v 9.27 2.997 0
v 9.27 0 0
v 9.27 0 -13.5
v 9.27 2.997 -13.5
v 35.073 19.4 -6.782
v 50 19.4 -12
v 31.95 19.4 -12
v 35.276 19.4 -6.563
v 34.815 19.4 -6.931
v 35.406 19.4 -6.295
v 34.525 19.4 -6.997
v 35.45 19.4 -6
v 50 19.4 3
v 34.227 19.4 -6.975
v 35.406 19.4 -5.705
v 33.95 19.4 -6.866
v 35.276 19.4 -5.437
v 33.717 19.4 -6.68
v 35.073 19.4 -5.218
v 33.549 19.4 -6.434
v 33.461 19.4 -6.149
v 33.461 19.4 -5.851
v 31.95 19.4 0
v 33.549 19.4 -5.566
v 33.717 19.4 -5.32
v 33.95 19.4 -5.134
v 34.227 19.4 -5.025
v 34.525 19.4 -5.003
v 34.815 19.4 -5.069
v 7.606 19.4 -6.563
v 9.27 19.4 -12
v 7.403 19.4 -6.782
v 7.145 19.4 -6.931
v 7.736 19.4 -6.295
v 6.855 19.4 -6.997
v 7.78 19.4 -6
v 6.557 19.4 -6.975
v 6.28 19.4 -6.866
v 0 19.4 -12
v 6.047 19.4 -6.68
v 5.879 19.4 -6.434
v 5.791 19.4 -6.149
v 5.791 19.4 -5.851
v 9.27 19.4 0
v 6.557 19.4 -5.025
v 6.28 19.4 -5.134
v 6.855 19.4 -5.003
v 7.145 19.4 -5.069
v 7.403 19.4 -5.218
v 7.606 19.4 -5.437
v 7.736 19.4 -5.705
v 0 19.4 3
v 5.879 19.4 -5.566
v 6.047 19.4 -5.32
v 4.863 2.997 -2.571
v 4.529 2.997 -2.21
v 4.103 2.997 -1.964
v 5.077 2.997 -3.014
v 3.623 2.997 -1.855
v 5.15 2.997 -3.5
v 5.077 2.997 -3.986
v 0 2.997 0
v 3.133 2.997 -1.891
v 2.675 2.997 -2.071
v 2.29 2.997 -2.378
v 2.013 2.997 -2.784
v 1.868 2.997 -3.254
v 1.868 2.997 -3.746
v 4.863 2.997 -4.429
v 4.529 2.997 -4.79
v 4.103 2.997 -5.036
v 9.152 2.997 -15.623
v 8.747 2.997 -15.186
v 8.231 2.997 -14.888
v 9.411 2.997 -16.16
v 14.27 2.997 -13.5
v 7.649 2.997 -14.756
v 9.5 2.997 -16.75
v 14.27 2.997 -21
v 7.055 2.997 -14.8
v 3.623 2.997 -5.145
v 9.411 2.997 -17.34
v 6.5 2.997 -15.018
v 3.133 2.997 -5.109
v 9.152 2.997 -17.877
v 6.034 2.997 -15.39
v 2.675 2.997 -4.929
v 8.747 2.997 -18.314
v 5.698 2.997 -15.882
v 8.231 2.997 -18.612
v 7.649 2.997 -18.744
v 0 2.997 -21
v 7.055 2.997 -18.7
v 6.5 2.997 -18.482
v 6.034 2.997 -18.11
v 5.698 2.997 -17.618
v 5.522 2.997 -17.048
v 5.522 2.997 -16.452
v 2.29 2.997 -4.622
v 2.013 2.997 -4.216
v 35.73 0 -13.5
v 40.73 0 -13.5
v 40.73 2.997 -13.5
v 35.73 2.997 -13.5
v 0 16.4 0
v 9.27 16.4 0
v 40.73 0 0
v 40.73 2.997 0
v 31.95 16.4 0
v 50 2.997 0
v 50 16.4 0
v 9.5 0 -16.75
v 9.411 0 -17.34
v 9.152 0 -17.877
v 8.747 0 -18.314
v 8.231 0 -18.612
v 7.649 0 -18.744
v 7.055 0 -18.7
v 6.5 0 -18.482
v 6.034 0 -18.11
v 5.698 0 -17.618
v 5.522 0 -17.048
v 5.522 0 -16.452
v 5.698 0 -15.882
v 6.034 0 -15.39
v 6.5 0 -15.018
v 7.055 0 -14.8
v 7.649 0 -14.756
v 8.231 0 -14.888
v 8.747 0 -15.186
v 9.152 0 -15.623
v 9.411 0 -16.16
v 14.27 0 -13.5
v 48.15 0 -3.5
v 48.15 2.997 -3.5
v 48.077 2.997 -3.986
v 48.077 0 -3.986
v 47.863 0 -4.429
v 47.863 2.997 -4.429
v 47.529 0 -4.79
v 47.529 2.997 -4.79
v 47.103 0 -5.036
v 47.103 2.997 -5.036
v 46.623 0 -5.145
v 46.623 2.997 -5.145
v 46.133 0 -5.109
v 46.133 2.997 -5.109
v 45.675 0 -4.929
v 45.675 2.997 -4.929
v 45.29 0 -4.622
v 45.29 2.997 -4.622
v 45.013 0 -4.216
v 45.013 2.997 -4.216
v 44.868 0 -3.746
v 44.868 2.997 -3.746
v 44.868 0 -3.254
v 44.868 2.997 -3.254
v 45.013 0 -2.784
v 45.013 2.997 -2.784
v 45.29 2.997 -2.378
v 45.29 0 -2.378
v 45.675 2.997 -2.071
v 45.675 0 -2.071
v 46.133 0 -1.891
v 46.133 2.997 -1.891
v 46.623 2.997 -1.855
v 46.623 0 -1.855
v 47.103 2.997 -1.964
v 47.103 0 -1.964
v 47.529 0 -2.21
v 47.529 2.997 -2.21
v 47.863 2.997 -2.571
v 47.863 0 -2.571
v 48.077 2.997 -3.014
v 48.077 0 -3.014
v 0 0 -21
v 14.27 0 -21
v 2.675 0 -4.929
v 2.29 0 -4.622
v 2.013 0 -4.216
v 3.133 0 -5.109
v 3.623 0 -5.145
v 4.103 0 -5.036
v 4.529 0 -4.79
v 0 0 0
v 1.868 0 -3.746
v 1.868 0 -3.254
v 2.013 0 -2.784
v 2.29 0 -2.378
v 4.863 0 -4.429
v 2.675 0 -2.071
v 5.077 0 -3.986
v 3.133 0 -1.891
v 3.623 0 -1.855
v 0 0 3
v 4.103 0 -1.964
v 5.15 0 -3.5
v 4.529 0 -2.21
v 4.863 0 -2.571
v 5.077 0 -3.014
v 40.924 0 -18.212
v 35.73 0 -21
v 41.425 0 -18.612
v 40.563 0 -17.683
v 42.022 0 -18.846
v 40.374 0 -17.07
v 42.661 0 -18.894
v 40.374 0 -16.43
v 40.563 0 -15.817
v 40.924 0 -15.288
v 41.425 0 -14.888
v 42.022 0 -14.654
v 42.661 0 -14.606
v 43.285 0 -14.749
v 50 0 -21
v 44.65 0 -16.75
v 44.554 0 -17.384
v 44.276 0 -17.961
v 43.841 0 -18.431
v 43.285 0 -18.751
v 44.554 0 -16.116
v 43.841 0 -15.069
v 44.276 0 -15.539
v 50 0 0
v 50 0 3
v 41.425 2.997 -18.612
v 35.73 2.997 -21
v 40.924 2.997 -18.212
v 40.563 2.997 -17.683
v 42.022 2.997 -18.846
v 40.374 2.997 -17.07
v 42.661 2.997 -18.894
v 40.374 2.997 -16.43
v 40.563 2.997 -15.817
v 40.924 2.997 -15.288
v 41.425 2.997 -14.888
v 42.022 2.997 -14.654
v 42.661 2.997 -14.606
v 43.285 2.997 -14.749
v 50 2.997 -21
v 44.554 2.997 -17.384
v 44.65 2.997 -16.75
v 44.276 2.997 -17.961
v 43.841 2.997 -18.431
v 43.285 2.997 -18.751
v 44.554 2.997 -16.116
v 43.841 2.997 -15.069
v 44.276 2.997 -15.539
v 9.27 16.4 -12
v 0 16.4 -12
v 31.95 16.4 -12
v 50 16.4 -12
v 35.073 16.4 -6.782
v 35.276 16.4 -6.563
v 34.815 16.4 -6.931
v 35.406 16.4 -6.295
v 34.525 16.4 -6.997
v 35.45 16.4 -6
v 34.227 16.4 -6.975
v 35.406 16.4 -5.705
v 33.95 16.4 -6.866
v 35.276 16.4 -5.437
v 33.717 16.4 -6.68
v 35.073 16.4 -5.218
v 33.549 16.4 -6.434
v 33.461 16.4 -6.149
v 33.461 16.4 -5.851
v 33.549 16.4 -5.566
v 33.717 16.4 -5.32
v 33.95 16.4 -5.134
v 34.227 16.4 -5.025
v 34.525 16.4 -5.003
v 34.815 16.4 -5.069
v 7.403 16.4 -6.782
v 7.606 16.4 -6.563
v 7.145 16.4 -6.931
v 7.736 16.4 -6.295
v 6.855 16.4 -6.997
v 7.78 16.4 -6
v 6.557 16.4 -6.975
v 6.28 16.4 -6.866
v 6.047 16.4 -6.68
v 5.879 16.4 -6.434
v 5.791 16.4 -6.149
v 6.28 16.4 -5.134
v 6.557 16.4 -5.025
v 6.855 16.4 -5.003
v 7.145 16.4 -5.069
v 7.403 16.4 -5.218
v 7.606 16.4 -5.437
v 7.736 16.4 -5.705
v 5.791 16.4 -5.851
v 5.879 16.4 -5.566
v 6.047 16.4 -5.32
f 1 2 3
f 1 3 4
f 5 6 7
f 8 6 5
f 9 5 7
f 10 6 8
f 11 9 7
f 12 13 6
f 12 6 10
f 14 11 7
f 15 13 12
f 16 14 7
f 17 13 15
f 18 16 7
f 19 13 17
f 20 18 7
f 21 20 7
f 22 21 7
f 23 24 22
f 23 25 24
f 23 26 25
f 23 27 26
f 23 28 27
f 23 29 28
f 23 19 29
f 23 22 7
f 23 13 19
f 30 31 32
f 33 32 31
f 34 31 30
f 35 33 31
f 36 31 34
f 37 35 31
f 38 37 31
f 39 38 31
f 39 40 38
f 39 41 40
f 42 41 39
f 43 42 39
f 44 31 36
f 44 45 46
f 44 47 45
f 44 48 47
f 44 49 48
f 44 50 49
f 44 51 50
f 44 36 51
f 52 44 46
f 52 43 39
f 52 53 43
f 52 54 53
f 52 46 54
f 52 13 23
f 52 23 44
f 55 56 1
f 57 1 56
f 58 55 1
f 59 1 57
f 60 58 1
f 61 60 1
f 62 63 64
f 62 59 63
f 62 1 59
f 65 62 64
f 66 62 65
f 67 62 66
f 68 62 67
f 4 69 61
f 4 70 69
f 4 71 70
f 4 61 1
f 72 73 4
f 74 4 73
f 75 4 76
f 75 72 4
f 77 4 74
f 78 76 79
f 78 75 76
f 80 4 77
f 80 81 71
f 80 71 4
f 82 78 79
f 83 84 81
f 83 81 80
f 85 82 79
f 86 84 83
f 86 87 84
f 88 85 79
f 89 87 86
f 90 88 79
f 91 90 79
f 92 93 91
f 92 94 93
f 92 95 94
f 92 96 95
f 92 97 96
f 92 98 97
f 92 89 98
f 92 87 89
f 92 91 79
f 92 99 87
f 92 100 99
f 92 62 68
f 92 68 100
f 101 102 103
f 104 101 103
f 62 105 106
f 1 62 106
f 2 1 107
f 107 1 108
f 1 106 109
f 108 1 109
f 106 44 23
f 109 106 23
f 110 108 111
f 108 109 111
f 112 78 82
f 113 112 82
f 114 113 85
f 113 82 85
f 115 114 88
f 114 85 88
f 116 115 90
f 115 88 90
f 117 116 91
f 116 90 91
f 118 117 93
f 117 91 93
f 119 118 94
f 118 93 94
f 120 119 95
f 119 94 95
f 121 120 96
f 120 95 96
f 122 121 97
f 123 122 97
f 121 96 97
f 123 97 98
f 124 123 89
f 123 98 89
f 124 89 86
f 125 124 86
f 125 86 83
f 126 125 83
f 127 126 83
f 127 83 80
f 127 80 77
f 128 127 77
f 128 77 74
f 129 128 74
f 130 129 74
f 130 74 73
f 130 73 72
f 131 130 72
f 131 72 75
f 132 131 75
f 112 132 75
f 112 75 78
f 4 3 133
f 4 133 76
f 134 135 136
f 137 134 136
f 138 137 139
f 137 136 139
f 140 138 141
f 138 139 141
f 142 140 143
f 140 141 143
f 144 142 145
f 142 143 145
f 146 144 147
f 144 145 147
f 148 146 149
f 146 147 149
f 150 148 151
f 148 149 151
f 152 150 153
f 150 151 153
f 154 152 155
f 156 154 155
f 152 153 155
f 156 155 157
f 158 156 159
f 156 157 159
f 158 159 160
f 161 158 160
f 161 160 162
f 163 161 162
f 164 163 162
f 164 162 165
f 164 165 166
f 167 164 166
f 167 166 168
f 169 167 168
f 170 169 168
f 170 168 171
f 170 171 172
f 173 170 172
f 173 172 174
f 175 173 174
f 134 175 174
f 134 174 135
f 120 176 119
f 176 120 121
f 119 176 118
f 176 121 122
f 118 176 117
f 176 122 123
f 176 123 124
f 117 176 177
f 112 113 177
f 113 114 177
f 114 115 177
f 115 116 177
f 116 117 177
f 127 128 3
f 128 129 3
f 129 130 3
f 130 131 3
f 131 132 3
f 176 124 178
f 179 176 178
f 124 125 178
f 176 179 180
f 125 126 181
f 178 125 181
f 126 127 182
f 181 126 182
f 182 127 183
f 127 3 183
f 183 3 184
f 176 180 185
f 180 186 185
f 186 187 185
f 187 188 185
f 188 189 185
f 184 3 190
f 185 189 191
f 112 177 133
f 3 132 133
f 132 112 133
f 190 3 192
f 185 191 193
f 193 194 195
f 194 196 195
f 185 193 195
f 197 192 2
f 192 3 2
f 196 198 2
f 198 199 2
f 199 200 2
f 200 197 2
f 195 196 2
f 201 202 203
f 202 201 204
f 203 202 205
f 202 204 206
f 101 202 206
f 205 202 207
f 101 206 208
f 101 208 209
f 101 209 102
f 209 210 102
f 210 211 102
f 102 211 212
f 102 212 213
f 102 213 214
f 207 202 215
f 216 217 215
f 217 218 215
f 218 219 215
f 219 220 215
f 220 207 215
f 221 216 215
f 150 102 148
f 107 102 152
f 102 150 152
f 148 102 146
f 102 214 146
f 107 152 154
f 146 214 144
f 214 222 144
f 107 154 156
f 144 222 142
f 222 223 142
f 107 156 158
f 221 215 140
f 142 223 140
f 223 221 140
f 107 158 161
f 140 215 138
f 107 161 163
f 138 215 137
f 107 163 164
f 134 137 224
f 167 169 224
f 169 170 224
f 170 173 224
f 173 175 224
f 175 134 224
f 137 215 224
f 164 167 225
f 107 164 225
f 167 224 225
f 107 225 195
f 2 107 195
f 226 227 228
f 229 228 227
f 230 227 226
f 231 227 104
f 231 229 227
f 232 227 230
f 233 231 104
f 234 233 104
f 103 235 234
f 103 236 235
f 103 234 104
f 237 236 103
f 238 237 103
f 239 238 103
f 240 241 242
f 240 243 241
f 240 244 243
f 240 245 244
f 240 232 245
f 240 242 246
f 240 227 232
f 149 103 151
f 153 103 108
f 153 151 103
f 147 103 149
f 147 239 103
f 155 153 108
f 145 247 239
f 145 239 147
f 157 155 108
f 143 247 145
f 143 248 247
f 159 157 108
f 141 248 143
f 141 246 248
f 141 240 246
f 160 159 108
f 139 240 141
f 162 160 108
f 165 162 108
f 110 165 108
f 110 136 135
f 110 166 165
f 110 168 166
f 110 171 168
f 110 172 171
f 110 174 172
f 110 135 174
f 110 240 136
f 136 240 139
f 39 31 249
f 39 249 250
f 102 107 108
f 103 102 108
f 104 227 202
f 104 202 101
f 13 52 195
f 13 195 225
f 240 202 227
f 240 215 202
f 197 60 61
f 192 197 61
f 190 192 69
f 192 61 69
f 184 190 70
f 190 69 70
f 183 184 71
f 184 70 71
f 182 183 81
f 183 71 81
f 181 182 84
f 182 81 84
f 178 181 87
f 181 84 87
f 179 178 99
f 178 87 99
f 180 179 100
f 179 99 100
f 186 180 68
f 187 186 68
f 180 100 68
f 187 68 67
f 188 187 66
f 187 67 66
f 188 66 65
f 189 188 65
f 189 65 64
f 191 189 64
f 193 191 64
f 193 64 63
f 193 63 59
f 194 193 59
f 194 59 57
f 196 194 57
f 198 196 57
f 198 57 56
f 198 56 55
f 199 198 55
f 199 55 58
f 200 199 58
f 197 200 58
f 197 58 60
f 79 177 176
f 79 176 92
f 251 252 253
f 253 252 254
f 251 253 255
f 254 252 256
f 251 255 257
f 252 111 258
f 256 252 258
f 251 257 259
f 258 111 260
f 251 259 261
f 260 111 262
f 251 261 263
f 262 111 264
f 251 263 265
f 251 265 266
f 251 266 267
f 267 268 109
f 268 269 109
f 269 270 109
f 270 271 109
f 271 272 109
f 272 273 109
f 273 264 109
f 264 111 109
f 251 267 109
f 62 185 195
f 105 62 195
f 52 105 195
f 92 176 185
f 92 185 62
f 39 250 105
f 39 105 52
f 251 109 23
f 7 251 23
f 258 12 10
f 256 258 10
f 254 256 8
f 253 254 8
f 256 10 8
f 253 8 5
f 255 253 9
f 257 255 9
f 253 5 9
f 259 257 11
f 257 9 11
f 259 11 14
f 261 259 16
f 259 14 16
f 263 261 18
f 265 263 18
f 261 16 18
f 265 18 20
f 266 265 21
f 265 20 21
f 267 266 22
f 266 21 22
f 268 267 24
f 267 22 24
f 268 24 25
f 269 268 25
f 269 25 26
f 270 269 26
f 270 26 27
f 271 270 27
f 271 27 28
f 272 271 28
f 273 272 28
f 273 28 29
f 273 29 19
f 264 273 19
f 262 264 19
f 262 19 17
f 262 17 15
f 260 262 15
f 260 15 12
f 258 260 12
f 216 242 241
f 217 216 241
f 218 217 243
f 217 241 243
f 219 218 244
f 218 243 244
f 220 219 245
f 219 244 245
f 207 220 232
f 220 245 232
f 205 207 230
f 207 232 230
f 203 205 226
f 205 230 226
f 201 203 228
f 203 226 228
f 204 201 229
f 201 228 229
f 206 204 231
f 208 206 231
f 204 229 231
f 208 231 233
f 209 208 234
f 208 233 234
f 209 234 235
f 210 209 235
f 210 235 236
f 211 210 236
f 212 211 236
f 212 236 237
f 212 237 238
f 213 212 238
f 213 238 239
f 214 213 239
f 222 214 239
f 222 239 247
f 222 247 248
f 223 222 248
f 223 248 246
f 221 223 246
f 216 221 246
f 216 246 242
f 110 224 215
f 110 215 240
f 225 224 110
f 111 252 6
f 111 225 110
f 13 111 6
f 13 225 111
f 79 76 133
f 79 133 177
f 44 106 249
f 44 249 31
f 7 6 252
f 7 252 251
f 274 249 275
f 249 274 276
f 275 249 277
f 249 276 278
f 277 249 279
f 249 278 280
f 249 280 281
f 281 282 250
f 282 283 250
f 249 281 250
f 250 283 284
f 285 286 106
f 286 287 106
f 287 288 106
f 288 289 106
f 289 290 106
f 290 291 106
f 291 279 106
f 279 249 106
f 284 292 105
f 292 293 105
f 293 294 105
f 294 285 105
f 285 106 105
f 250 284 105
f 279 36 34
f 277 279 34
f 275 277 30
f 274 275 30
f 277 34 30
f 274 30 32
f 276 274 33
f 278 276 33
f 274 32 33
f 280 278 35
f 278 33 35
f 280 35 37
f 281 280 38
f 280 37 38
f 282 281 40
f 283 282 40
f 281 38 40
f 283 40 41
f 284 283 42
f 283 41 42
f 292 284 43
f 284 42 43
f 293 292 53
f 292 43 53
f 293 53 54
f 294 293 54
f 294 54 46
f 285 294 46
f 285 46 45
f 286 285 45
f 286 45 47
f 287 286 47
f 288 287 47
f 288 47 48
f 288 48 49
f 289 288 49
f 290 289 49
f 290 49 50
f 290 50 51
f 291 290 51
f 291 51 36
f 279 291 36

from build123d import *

# Parameters (mm, degrees)
SKETCH_1_W          = 50
SKETCH_1_H          = 19.4
EXTRUDE_1_DEPTH     = 3
SKETCH_2_W          = 18.05
SKETCH_2_H          = 3
SKETCH_2_W_2        = 9.27
EXTRUDE_3_DEPTH     = 12
SKETCH_5_R          = 1
CUT_EXTRUDE_1_DEPTH = 4
SKETCH_6_W          = 9.27
SKETCH_6_H          = 2.996679997
EXTRUDE_5_DEPTH     = 21
SKETCH_9_W          = 7.5
SKETCH_9_H          = 2.996679997
EXTRUDE_6_DEPTH     = 5
SKETCH_10_W         = 7.5
SKETCH_10_H         = 2.996679997
EXTRUDE_7_DEPTH     = 5
SKETCH_11_R         = 2.15
SKETCH_11_R_2       = 1.65
CUT_EXTRUDE_3_DEPTH = 5
SKETCH_12_R         = 2
SKETCH_12_R_2       = 1.65
CUT_EXTRUDE_4_DEPTH = 5


with BuildPart() as part:
    # 草图1 → 凸台-拉伸1 (new body)
    with BuildSketch(Plane.XY):
        with Locations((25, 9.7)):
            Rectangle(SKETCH_1_W, SKETCH_1_H)
    extrude(amount=EXTRUDE_1_DEPTH)

    # 草图2 → 凸台-拉伸3 (add)
    with BuildSketch(Plane(origin=(0, 0, 0), x_dir=(-1, 0, 0), z_dir=(0, 0, -1))):
        with Locations((-40.975, 17.9)):
            Rectangle(SKETCH_2_W, SKETCH_2_H)
        with Locations((-4.635, 17.9)):
            Rectangle(SKETCH_2_W_2, SKETCH_2_H)
    extrude(amount=EXTRUDE_3_DEPTH)

    # 草图5 → 切除-拉伸1 (cut)
    with BuildSketch(Plane(origin=(0, 19.4, 0), x_dir=(1, 0, 0), z_dir=(0, 1, 0))):
        with Locations((34.45, 6)):
            Circle(SKETCH_5_R)
        with Locations((6.78, 6)):
            Circle(SKETCH_5_R)
    extrude(amount=-CUT_EXTRUDE_1_DEPTH, mode=Mode.SUBTRACT)

    # 草图6 → 凸台-拉伸5 (add)
    with BuildSketch(Plane(origin=(0, 0, 0), x_dir=(-1, 0, 0), z_dir=(0, 0, -1))):
        with Locations((-45.365, 1.498339999)):
            Rectangle(SKETCH_6_W, SKETCH_6_H)
        with Locations((-4.635, 1.498339999)):
            Rectangle(SKETCH_6_W, SKETCH_6_H)
    extrude(amount=EXTRUDE_5_DEPTH)

    # 草图9 → 凸台-拉伸6 (add)
    with BuildSketch(Plane(origin=(9.27, 0, 0), x_dir=(0, 0, -1), z_dir=(1, 0, 0))):
        with Locations((17.25, 1.498339999)):
            Rectangle(SKETCH_9_W, SKETCH_9_H)
    extrude(amount=EXTRUDE_6_DEPTH)

    # 草图10 → 凸台-拉伸7 (add)
    with BuildSketch(Plane.ZY.offset(-40.73)):
        with Locations((-17.25, 1.498339999)):
            Rectangle(SKETCH_10_W, SKETCH_10_H)
    extrude(amount=EXTRUDE_7_DEPTH)

    # 草图11 → 切除-拉伸3 (cut)
    with BuildSketch(Plane(origin=(0, 2.996679997, 0), x_dir=(1, 0, 0), z_dir=(0, 1, 0))):
        with Locations((42.5, 16.75)):
            Circle(SKETCH_11_R)
        with Locations((46.5, 3.5)):
            Circle(SKETCH_11_R_2)
    extrude(amount=-CUT_EXTRUDE_3_DEPTH, mode=Mode.SUBTRACT)

    # 草图12 → 切除-拉伸4 (cut)
    with BuildSketch(Plane(origin=(0, 2.996679997, 0), x_dir=(1, 0, 0), z_dir=(0, 1, 0))):
        with Locations((7.5, 16.75)):
            Circle(SKETCH_12_R)
        with Locations((3.5, 3.5)):
            Circle(SKETCH_12_R_2)
    extrude(amount=-CUT_EXTRUDE_4_DEPTH, mode=Mode.SUBTRACT)


solid = part.part
